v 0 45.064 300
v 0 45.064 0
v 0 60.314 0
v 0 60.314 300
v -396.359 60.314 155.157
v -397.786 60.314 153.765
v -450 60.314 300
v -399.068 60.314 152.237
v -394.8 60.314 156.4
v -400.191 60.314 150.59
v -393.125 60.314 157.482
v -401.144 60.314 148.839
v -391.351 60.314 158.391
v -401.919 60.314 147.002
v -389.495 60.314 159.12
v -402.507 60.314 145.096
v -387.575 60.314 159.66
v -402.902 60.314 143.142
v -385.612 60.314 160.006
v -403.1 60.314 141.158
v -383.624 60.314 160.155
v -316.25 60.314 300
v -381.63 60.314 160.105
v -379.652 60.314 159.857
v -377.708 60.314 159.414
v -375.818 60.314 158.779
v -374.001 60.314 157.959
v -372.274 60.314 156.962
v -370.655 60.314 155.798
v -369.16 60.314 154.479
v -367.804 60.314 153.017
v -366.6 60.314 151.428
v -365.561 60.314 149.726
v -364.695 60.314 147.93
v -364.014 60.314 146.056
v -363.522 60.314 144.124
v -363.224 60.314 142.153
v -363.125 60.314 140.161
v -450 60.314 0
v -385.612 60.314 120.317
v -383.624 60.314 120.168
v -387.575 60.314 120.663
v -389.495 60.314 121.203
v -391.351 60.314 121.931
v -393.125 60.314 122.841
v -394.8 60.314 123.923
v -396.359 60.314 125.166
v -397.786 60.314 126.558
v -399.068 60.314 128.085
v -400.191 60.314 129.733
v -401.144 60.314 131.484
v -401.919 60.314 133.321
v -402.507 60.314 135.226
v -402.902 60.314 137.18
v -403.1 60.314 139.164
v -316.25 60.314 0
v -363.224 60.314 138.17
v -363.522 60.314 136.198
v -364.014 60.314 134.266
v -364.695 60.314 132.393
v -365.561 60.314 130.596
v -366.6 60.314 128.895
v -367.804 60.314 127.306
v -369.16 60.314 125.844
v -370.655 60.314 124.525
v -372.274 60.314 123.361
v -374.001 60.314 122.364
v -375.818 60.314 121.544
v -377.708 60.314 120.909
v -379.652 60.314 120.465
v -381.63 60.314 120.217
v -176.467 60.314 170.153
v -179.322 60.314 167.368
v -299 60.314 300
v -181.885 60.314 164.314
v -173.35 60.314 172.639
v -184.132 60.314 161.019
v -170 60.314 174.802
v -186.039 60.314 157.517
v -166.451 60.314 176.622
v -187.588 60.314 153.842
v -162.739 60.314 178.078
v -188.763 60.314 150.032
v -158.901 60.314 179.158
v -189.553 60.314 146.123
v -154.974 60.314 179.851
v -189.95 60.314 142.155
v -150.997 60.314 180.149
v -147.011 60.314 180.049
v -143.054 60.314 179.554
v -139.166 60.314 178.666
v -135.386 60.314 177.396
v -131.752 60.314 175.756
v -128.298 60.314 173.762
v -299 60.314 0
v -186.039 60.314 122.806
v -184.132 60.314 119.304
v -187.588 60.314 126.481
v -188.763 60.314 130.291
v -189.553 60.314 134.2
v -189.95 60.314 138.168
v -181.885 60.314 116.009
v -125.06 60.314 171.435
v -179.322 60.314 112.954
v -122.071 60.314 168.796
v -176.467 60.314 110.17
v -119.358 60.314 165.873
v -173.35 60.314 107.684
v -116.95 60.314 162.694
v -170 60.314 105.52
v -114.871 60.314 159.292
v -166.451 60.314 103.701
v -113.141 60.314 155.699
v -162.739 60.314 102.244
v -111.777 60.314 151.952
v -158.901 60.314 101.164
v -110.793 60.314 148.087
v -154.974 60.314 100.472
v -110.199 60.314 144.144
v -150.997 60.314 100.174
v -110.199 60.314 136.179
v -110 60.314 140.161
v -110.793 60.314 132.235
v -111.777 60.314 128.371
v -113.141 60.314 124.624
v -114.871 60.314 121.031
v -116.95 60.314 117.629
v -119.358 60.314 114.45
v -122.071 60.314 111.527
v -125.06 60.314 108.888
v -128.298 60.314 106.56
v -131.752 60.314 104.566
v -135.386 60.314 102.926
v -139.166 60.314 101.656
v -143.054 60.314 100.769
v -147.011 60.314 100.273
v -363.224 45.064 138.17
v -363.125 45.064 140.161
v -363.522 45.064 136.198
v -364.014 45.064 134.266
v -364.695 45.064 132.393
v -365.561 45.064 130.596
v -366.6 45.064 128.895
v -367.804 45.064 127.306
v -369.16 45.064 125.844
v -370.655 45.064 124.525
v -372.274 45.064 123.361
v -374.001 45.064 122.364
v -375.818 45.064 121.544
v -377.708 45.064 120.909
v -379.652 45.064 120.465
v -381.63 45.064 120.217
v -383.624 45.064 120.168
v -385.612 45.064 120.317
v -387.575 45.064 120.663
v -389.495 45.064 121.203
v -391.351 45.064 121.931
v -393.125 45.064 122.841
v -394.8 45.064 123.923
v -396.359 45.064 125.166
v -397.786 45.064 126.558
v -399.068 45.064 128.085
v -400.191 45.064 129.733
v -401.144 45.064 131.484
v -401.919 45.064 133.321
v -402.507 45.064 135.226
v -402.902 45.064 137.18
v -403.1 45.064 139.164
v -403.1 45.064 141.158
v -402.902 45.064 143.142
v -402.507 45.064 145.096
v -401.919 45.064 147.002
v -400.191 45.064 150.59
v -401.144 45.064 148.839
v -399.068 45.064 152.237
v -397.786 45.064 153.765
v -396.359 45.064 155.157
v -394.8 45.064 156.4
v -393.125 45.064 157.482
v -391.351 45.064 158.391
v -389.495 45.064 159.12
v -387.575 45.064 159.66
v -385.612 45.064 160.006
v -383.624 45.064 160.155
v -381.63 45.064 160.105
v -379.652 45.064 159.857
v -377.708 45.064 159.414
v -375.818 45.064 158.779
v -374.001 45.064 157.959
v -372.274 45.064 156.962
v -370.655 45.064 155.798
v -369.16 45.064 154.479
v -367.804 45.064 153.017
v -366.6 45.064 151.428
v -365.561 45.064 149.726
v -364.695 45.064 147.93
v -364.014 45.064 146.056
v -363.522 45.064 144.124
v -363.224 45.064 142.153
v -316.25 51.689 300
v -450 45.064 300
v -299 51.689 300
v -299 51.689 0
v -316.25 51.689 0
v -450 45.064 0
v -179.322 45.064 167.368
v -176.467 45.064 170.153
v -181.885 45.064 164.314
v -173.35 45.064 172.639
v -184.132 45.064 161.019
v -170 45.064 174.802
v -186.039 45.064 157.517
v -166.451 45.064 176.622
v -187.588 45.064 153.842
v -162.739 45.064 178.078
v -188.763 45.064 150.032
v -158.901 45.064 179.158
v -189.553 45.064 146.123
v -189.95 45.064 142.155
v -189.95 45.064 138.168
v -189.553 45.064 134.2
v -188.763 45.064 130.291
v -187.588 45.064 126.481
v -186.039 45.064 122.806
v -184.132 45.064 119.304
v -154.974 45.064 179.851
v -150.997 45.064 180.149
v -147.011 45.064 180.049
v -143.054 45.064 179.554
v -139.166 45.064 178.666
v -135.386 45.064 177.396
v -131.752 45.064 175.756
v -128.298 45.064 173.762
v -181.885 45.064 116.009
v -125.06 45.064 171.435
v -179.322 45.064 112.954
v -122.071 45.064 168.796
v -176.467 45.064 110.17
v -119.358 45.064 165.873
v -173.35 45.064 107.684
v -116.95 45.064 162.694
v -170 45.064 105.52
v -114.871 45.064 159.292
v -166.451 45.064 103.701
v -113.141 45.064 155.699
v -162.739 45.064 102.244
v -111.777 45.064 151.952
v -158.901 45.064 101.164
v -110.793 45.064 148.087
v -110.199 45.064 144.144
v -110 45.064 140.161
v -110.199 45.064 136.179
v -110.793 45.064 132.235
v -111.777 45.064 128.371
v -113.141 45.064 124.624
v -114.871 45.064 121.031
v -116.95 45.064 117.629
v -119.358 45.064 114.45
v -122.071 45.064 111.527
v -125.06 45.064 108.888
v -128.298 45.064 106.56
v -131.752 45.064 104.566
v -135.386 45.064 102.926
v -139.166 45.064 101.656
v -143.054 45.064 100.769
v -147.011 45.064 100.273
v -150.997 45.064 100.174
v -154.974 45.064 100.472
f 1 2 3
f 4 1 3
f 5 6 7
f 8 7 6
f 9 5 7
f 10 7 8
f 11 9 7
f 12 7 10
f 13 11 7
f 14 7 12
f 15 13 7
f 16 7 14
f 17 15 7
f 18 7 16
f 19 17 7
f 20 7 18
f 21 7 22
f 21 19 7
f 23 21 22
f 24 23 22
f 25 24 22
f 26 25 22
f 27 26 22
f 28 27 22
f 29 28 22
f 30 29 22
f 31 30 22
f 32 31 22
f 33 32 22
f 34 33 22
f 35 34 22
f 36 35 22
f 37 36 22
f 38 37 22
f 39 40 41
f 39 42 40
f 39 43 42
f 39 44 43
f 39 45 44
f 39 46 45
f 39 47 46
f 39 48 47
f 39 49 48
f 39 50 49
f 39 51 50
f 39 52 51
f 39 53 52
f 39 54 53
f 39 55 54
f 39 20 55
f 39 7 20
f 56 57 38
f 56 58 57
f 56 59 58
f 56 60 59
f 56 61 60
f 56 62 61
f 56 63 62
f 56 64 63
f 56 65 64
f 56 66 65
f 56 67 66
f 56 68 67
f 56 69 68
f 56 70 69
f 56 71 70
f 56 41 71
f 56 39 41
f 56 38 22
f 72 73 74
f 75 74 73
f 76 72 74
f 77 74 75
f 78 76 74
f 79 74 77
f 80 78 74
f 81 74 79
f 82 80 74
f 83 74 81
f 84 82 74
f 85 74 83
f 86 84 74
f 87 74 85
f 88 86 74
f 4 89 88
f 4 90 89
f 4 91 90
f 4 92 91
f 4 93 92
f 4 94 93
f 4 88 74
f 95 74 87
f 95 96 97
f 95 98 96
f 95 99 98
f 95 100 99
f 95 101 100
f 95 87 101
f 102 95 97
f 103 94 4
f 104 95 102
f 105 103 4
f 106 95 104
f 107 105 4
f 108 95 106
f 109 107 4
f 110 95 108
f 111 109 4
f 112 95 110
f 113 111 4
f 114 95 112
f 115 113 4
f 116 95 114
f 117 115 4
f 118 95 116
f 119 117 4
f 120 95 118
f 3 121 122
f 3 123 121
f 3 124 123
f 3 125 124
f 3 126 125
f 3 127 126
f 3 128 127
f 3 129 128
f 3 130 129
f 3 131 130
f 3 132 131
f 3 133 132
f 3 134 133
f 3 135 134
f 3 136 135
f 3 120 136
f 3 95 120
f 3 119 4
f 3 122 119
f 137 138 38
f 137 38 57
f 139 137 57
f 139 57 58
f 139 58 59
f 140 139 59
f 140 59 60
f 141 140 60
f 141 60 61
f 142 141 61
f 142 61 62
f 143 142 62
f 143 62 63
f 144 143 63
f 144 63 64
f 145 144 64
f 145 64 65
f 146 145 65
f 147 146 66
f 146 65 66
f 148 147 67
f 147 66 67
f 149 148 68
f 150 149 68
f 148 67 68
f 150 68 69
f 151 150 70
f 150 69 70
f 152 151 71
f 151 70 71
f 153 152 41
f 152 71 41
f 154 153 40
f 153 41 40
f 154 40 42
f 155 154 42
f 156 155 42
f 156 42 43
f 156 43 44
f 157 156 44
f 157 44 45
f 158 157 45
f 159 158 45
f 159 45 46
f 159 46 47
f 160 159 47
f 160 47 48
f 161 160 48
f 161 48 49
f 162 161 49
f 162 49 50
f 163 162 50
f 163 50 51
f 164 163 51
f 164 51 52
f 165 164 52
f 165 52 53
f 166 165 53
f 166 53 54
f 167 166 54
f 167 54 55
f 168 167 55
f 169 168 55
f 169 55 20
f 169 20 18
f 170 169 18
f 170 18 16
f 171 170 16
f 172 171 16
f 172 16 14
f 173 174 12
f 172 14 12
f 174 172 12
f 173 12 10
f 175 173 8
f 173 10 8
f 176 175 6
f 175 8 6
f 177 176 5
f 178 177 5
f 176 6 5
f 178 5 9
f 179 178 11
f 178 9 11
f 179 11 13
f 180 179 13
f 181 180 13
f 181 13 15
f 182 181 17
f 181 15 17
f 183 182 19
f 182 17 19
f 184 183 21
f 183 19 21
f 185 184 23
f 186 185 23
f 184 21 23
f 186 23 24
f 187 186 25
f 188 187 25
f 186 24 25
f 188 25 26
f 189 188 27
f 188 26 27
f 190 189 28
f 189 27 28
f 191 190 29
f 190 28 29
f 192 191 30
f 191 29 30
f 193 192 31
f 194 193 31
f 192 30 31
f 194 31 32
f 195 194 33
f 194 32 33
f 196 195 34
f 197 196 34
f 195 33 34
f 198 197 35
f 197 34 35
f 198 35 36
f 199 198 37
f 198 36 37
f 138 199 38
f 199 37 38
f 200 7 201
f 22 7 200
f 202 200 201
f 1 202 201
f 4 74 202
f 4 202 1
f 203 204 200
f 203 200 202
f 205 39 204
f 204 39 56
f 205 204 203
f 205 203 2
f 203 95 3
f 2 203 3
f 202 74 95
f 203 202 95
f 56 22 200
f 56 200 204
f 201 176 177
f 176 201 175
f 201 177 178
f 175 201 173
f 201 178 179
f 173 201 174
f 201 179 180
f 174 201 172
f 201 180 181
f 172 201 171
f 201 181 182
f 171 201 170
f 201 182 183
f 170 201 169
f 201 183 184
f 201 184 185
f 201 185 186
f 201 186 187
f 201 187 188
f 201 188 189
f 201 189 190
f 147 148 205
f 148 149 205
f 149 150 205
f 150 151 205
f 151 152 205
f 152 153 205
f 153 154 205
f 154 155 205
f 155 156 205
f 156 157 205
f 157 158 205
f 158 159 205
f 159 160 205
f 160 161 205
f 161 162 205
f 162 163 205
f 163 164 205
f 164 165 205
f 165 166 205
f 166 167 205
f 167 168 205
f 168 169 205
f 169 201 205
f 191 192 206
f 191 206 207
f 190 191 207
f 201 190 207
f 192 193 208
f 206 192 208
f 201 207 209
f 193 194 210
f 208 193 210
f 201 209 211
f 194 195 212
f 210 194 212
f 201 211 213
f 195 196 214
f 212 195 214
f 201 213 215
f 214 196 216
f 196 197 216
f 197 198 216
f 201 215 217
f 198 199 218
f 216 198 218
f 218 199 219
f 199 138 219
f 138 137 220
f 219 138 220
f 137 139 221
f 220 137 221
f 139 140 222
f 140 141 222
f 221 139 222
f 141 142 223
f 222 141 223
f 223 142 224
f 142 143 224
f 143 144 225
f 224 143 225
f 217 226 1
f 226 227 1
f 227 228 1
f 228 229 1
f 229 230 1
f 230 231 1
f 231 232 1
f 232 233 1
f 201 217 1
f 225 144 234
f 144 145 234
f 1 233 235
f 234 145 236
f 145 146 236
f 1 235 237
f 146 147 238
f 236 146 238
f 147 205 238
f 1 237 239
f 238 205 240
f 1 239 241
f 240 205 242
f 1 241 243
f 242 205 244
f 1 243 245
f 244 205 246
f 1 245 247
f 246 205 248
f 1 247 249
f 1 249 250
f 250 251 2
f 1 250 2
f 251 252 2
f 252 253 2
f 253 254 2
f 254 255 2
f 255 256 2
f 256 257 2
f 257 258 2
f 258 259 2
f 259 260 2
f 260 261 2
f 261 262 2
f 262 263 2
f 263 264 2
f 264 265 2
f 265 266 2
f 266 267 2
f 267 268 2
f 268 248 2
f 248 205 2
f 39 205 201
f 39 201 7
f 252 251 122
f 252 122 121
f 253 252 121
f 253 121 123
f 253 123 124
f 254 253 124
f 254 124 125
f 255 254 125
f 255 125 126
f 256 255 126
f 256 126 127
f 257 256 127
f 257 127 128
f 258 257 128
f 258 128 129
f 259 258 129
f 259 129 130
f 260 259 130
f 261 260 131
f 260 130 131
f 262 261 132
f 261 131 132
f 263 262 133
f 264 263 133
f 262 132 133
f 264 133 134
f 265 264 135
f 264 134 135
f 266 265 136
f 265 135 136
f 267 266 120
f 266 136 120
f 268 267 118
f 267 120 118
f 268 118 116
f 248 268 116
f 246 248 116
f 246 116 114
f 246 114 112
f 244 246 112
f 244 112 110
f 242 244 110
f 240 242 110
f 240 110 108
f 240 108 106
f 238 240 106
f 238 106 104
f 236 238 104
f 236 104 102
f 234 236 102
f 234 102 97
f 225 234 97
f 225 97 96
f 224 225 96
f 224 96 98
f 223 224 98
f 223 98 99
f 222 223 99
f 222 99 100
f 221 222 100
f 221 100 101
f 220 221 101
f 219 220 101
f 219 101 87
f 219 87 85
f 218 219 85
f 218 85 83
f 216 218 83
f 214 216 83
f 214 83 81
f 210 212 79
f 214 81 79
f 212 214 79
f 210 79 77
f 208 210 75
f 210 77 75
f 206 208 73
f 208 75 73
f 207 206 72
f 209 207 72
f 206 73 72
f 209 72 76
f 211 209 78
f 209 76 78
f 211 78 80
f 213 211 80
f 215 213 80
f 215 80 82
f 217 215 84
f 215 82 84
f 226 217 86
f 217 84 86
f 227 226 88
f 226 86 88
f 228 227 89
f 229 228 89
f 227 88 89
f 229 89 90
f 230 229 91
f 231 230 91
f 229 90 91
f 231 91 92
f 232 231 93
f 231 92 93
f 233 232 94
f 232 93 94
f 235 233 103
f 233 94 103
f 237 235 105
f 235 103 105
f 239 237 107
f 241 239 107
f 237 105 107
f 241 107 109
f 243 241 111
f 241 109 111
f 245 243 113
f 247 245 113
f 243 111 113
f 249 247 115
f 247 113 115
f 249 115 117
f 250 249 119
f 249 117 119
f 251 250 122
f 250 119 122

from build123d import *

# Parameters (mm, degrees)
ESQUISSE1_W             = 450
ESQUISSE1_H             = 15.25
BOSS_EXTRU_1_DEPTH      = 300
ESQUISSE2_W             = 17.25
ESQUISSE2_H             = 300
ENL_V_MAT_EXTRU_1_DEPTH = 8.625
ENL_V_MAT_EXTRU_2_REACH = 17.25
ESQUISSE3_R             = 40
ESQUISSE3_R_2           = 20


with BuildPart() as part:
    # Esquisse1 → Boss.-Extru.1 (new body)
    with BuildSketch(Plane.XY):
        with Locations((-225, 52.688864629)):
            Rectangle(ESQUISSE1_W, ESQUISSE1_H)
    extrude(amount=BOSS_EXTRU_1_DEPTH)

    # Esquisse2 → Enlèv. mat.-Extru.1 (cut)
    with BuildSketch(Plane(origin=(0, 60.313864629, 0), x_dir=(1, 0, 0), z_dir=(0, 1, 0))):
        with Locations((-307.625, -150)):
            Rectangle(ESQUISSE2_W, ESQUISSE2_H)
    extrude(amount=-ENL_V_MAT_EXTRU_1_DEPTH, mode=Mode.SUBTRACT)

    # Esquisse3 → Enlèv. mat.-Extru.2 (cut, up to next)
    with BuildSketch(Plane(origin=(0, 60.313864629, 0), x_dir=(1, 0, 0), z_dir=(0, 1, 0)), mode=Mode.PRIVATE) as enl_v_mat_extru_2_sk1:
        with Locations((-150, -140.161341078)):
            Circle(ESQUISSE3_R)
    enl_v_mat_extru_2_tool1 = extrude(enl_v_mat_extru_2_sk1.sketch, amount=-ENL_V_MAT_EXTRU_2_REACH, mode=Mode.PRIVATE) & part.part
    add(enl_v_mat_extru_2_tool1.solids().sort_by_distance((-150, 60.313865, 140.161341))[0], mode=Mode.SUBTRACT)
    # Esquisse3 → Enlèv. mat.-Extru.2 (cut, up to next)
    with BuildSketch(Plane(origin=(0, 60.313864629, 0), x_dir=(1, 0, 0), z_dir=(0, 1, 0)), mode=Mode.PRIVATE) as enl_v_mat_extru_2_sk2:
        with Locations((-383.125, -140.161341078)):
            Circle(ESQUISSE3_R_2)
    enl_v_mat_extru_2_tool2 = extrude(enl_v_mat_extru_2_sk2.sketch, amount=-ENL_V_MAT_EXTRU_2_REACH, mode=Mode.PRIVATE) & part.part
    add(enl_v_mat_extru_2_tool2.solids().sort_by_distance((-383.125, 60.313865, 140.161341))[0], mode=Mode.SUBTRACT)


solid = part.part
